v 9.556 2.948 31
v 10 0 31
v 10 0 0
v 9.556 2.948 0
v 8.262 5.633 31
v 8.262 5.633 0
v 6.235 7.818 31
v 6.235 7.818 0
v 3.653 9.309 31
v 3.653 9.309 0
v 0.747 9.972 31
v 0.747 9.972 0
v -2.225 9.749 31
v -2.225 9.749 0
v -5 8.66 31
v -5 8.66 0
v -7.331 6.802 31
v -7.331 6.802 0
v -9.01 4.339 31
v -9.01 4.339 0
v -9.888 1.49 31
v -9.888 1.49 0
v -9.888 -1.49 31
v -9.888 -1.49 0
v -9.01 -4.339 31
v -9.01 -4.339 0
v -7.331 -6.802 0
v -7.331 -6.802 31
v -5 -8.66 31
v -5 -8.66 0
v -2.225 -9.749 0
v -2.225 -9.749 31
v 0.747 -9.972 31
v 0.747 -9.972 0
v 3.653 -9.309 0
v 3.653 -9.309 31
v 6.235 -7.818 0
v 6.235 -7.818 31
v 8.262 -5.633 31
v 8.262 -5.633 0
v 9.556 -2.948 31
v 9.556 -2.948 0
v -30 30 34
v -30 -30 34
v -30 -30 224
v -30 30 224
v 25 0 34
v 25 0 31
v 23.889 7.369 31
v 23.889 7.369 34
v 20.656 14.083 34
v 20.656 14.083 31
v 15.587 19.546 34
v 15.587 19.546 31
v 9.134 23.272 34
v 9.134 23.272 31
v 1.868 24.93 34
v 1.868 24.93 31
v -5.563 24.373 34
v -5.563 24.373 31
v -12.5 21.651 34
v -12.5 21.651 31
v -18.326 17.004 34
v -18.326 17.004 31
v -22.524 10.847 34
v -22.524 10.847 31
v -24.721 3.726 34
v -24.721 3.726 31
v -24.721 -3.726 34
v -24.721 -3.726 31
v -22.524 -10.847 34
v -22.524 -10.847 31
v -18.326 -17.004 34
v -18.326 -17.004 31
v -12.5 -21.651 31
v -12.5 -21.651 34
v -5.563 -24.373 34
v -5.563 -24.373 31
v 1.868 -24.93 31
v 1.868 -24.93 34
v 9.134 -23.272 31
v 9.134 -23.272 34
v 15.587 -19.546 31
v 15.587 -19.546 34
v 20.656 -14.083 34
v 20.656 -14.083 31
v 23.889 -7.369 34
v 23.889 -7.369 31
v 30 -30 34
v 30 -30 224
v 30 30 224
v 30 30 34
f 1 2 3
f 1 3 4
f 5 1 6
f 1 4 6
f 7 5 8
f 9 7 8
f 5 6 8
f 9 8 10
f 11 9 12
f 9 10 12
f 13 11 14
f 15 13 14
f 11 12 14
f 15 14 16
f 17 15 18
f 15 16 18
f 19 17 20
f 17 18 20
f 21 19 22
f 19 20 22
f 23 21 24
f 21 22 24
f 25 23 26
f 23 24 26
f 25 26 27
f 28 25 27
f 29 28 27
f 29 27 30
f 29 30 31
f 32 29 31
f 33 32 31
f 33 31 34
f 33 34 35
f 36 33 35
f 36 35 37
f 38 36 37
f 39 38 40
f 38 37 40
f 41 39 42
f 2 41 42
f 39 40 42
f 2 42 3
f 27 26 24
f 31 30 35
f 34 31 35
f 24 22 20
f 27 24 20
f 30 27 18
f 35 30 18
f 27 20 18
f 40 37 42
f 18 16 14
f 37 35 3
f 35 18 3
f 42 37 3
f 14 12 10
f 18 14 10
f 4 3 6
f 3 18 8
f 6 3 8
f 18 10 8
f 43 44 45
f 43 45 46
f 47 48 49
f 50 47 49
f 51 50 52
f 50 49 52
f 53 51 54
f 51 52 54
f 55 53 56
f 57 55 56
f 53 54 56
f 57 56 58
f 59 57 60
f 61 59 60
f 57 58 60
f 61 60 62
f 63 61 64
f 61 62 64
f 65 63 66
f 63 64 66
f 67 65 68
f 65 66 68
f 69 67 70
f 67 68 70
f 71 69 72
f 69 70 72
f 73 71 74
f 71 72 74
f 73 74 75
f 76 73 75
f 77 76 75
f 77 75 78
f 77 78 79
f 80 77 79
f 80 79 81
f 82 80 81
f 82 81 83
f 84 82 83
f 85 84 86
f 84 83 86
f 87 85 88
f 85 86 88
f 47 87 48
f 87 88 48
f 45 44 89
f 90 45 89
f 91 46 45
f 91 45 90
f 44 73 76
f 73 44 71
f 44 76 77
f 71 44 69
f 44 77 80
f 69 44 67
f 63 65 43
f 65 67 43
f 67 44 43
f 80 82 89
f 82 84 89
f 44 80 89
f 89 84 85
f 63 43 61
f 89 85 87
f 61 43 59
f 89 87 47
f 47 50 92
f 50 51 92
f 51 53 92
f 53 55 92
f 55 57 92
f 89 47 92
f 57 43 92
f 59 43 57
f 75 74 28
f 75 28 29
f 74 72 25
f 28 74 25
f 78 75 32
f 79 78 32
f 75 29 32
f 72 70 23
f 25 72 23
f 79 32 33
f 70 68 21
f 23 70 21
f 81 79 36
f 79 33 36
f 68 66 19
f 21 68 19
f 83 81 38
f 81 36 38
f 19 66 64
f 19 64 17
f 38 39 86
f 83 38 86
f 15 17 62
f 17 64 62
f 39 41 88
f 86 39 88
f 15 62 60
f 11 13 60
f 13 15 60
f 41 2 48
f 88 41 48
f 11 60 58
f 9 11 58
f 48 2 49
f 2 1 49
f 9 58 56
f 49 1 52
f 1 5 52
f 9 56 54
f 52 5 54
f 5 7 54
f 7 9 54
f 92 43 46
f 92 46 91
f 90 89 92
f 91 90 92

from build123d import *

# Parameters (mm, degrees)
F0_R     = 10
F1_DEPTH = 31
F2_R     = 25
F2_R_2   = 10
F3_DEPTH = 3
F4_W     = 60
F4_H     = 60
F4_R     = 25
F5_DEPTH = 190


with BuildPart() as f1:
    # F0 (on Top) → F1 (new body)
    with BuildSketch(Plane.XY):
        Circle(F0_R)
    extrude(amount=F1_DEPTH)

    # F2 (on face) → F3 (join)
    with BuildSketch(Plane.XY.offset(31)):
        Circle(F2_R)
        Circle(F2_R_2, mode=Mode.SUBTRACT)
        Circle(F2_R_2)
    extrude(amount=F3_DEPTH)

    # F4 (on face) → F5 (join)
    with BuildSketch(Plane.XY.offset(34)):
        Rectangle(F4_W, F4_H)
        Circle(F4_R, mode=Mode.SUBTRACT)
        Circle(F4_R)
    extrude(amount=F5_DEPTH)


solid = f1.part
